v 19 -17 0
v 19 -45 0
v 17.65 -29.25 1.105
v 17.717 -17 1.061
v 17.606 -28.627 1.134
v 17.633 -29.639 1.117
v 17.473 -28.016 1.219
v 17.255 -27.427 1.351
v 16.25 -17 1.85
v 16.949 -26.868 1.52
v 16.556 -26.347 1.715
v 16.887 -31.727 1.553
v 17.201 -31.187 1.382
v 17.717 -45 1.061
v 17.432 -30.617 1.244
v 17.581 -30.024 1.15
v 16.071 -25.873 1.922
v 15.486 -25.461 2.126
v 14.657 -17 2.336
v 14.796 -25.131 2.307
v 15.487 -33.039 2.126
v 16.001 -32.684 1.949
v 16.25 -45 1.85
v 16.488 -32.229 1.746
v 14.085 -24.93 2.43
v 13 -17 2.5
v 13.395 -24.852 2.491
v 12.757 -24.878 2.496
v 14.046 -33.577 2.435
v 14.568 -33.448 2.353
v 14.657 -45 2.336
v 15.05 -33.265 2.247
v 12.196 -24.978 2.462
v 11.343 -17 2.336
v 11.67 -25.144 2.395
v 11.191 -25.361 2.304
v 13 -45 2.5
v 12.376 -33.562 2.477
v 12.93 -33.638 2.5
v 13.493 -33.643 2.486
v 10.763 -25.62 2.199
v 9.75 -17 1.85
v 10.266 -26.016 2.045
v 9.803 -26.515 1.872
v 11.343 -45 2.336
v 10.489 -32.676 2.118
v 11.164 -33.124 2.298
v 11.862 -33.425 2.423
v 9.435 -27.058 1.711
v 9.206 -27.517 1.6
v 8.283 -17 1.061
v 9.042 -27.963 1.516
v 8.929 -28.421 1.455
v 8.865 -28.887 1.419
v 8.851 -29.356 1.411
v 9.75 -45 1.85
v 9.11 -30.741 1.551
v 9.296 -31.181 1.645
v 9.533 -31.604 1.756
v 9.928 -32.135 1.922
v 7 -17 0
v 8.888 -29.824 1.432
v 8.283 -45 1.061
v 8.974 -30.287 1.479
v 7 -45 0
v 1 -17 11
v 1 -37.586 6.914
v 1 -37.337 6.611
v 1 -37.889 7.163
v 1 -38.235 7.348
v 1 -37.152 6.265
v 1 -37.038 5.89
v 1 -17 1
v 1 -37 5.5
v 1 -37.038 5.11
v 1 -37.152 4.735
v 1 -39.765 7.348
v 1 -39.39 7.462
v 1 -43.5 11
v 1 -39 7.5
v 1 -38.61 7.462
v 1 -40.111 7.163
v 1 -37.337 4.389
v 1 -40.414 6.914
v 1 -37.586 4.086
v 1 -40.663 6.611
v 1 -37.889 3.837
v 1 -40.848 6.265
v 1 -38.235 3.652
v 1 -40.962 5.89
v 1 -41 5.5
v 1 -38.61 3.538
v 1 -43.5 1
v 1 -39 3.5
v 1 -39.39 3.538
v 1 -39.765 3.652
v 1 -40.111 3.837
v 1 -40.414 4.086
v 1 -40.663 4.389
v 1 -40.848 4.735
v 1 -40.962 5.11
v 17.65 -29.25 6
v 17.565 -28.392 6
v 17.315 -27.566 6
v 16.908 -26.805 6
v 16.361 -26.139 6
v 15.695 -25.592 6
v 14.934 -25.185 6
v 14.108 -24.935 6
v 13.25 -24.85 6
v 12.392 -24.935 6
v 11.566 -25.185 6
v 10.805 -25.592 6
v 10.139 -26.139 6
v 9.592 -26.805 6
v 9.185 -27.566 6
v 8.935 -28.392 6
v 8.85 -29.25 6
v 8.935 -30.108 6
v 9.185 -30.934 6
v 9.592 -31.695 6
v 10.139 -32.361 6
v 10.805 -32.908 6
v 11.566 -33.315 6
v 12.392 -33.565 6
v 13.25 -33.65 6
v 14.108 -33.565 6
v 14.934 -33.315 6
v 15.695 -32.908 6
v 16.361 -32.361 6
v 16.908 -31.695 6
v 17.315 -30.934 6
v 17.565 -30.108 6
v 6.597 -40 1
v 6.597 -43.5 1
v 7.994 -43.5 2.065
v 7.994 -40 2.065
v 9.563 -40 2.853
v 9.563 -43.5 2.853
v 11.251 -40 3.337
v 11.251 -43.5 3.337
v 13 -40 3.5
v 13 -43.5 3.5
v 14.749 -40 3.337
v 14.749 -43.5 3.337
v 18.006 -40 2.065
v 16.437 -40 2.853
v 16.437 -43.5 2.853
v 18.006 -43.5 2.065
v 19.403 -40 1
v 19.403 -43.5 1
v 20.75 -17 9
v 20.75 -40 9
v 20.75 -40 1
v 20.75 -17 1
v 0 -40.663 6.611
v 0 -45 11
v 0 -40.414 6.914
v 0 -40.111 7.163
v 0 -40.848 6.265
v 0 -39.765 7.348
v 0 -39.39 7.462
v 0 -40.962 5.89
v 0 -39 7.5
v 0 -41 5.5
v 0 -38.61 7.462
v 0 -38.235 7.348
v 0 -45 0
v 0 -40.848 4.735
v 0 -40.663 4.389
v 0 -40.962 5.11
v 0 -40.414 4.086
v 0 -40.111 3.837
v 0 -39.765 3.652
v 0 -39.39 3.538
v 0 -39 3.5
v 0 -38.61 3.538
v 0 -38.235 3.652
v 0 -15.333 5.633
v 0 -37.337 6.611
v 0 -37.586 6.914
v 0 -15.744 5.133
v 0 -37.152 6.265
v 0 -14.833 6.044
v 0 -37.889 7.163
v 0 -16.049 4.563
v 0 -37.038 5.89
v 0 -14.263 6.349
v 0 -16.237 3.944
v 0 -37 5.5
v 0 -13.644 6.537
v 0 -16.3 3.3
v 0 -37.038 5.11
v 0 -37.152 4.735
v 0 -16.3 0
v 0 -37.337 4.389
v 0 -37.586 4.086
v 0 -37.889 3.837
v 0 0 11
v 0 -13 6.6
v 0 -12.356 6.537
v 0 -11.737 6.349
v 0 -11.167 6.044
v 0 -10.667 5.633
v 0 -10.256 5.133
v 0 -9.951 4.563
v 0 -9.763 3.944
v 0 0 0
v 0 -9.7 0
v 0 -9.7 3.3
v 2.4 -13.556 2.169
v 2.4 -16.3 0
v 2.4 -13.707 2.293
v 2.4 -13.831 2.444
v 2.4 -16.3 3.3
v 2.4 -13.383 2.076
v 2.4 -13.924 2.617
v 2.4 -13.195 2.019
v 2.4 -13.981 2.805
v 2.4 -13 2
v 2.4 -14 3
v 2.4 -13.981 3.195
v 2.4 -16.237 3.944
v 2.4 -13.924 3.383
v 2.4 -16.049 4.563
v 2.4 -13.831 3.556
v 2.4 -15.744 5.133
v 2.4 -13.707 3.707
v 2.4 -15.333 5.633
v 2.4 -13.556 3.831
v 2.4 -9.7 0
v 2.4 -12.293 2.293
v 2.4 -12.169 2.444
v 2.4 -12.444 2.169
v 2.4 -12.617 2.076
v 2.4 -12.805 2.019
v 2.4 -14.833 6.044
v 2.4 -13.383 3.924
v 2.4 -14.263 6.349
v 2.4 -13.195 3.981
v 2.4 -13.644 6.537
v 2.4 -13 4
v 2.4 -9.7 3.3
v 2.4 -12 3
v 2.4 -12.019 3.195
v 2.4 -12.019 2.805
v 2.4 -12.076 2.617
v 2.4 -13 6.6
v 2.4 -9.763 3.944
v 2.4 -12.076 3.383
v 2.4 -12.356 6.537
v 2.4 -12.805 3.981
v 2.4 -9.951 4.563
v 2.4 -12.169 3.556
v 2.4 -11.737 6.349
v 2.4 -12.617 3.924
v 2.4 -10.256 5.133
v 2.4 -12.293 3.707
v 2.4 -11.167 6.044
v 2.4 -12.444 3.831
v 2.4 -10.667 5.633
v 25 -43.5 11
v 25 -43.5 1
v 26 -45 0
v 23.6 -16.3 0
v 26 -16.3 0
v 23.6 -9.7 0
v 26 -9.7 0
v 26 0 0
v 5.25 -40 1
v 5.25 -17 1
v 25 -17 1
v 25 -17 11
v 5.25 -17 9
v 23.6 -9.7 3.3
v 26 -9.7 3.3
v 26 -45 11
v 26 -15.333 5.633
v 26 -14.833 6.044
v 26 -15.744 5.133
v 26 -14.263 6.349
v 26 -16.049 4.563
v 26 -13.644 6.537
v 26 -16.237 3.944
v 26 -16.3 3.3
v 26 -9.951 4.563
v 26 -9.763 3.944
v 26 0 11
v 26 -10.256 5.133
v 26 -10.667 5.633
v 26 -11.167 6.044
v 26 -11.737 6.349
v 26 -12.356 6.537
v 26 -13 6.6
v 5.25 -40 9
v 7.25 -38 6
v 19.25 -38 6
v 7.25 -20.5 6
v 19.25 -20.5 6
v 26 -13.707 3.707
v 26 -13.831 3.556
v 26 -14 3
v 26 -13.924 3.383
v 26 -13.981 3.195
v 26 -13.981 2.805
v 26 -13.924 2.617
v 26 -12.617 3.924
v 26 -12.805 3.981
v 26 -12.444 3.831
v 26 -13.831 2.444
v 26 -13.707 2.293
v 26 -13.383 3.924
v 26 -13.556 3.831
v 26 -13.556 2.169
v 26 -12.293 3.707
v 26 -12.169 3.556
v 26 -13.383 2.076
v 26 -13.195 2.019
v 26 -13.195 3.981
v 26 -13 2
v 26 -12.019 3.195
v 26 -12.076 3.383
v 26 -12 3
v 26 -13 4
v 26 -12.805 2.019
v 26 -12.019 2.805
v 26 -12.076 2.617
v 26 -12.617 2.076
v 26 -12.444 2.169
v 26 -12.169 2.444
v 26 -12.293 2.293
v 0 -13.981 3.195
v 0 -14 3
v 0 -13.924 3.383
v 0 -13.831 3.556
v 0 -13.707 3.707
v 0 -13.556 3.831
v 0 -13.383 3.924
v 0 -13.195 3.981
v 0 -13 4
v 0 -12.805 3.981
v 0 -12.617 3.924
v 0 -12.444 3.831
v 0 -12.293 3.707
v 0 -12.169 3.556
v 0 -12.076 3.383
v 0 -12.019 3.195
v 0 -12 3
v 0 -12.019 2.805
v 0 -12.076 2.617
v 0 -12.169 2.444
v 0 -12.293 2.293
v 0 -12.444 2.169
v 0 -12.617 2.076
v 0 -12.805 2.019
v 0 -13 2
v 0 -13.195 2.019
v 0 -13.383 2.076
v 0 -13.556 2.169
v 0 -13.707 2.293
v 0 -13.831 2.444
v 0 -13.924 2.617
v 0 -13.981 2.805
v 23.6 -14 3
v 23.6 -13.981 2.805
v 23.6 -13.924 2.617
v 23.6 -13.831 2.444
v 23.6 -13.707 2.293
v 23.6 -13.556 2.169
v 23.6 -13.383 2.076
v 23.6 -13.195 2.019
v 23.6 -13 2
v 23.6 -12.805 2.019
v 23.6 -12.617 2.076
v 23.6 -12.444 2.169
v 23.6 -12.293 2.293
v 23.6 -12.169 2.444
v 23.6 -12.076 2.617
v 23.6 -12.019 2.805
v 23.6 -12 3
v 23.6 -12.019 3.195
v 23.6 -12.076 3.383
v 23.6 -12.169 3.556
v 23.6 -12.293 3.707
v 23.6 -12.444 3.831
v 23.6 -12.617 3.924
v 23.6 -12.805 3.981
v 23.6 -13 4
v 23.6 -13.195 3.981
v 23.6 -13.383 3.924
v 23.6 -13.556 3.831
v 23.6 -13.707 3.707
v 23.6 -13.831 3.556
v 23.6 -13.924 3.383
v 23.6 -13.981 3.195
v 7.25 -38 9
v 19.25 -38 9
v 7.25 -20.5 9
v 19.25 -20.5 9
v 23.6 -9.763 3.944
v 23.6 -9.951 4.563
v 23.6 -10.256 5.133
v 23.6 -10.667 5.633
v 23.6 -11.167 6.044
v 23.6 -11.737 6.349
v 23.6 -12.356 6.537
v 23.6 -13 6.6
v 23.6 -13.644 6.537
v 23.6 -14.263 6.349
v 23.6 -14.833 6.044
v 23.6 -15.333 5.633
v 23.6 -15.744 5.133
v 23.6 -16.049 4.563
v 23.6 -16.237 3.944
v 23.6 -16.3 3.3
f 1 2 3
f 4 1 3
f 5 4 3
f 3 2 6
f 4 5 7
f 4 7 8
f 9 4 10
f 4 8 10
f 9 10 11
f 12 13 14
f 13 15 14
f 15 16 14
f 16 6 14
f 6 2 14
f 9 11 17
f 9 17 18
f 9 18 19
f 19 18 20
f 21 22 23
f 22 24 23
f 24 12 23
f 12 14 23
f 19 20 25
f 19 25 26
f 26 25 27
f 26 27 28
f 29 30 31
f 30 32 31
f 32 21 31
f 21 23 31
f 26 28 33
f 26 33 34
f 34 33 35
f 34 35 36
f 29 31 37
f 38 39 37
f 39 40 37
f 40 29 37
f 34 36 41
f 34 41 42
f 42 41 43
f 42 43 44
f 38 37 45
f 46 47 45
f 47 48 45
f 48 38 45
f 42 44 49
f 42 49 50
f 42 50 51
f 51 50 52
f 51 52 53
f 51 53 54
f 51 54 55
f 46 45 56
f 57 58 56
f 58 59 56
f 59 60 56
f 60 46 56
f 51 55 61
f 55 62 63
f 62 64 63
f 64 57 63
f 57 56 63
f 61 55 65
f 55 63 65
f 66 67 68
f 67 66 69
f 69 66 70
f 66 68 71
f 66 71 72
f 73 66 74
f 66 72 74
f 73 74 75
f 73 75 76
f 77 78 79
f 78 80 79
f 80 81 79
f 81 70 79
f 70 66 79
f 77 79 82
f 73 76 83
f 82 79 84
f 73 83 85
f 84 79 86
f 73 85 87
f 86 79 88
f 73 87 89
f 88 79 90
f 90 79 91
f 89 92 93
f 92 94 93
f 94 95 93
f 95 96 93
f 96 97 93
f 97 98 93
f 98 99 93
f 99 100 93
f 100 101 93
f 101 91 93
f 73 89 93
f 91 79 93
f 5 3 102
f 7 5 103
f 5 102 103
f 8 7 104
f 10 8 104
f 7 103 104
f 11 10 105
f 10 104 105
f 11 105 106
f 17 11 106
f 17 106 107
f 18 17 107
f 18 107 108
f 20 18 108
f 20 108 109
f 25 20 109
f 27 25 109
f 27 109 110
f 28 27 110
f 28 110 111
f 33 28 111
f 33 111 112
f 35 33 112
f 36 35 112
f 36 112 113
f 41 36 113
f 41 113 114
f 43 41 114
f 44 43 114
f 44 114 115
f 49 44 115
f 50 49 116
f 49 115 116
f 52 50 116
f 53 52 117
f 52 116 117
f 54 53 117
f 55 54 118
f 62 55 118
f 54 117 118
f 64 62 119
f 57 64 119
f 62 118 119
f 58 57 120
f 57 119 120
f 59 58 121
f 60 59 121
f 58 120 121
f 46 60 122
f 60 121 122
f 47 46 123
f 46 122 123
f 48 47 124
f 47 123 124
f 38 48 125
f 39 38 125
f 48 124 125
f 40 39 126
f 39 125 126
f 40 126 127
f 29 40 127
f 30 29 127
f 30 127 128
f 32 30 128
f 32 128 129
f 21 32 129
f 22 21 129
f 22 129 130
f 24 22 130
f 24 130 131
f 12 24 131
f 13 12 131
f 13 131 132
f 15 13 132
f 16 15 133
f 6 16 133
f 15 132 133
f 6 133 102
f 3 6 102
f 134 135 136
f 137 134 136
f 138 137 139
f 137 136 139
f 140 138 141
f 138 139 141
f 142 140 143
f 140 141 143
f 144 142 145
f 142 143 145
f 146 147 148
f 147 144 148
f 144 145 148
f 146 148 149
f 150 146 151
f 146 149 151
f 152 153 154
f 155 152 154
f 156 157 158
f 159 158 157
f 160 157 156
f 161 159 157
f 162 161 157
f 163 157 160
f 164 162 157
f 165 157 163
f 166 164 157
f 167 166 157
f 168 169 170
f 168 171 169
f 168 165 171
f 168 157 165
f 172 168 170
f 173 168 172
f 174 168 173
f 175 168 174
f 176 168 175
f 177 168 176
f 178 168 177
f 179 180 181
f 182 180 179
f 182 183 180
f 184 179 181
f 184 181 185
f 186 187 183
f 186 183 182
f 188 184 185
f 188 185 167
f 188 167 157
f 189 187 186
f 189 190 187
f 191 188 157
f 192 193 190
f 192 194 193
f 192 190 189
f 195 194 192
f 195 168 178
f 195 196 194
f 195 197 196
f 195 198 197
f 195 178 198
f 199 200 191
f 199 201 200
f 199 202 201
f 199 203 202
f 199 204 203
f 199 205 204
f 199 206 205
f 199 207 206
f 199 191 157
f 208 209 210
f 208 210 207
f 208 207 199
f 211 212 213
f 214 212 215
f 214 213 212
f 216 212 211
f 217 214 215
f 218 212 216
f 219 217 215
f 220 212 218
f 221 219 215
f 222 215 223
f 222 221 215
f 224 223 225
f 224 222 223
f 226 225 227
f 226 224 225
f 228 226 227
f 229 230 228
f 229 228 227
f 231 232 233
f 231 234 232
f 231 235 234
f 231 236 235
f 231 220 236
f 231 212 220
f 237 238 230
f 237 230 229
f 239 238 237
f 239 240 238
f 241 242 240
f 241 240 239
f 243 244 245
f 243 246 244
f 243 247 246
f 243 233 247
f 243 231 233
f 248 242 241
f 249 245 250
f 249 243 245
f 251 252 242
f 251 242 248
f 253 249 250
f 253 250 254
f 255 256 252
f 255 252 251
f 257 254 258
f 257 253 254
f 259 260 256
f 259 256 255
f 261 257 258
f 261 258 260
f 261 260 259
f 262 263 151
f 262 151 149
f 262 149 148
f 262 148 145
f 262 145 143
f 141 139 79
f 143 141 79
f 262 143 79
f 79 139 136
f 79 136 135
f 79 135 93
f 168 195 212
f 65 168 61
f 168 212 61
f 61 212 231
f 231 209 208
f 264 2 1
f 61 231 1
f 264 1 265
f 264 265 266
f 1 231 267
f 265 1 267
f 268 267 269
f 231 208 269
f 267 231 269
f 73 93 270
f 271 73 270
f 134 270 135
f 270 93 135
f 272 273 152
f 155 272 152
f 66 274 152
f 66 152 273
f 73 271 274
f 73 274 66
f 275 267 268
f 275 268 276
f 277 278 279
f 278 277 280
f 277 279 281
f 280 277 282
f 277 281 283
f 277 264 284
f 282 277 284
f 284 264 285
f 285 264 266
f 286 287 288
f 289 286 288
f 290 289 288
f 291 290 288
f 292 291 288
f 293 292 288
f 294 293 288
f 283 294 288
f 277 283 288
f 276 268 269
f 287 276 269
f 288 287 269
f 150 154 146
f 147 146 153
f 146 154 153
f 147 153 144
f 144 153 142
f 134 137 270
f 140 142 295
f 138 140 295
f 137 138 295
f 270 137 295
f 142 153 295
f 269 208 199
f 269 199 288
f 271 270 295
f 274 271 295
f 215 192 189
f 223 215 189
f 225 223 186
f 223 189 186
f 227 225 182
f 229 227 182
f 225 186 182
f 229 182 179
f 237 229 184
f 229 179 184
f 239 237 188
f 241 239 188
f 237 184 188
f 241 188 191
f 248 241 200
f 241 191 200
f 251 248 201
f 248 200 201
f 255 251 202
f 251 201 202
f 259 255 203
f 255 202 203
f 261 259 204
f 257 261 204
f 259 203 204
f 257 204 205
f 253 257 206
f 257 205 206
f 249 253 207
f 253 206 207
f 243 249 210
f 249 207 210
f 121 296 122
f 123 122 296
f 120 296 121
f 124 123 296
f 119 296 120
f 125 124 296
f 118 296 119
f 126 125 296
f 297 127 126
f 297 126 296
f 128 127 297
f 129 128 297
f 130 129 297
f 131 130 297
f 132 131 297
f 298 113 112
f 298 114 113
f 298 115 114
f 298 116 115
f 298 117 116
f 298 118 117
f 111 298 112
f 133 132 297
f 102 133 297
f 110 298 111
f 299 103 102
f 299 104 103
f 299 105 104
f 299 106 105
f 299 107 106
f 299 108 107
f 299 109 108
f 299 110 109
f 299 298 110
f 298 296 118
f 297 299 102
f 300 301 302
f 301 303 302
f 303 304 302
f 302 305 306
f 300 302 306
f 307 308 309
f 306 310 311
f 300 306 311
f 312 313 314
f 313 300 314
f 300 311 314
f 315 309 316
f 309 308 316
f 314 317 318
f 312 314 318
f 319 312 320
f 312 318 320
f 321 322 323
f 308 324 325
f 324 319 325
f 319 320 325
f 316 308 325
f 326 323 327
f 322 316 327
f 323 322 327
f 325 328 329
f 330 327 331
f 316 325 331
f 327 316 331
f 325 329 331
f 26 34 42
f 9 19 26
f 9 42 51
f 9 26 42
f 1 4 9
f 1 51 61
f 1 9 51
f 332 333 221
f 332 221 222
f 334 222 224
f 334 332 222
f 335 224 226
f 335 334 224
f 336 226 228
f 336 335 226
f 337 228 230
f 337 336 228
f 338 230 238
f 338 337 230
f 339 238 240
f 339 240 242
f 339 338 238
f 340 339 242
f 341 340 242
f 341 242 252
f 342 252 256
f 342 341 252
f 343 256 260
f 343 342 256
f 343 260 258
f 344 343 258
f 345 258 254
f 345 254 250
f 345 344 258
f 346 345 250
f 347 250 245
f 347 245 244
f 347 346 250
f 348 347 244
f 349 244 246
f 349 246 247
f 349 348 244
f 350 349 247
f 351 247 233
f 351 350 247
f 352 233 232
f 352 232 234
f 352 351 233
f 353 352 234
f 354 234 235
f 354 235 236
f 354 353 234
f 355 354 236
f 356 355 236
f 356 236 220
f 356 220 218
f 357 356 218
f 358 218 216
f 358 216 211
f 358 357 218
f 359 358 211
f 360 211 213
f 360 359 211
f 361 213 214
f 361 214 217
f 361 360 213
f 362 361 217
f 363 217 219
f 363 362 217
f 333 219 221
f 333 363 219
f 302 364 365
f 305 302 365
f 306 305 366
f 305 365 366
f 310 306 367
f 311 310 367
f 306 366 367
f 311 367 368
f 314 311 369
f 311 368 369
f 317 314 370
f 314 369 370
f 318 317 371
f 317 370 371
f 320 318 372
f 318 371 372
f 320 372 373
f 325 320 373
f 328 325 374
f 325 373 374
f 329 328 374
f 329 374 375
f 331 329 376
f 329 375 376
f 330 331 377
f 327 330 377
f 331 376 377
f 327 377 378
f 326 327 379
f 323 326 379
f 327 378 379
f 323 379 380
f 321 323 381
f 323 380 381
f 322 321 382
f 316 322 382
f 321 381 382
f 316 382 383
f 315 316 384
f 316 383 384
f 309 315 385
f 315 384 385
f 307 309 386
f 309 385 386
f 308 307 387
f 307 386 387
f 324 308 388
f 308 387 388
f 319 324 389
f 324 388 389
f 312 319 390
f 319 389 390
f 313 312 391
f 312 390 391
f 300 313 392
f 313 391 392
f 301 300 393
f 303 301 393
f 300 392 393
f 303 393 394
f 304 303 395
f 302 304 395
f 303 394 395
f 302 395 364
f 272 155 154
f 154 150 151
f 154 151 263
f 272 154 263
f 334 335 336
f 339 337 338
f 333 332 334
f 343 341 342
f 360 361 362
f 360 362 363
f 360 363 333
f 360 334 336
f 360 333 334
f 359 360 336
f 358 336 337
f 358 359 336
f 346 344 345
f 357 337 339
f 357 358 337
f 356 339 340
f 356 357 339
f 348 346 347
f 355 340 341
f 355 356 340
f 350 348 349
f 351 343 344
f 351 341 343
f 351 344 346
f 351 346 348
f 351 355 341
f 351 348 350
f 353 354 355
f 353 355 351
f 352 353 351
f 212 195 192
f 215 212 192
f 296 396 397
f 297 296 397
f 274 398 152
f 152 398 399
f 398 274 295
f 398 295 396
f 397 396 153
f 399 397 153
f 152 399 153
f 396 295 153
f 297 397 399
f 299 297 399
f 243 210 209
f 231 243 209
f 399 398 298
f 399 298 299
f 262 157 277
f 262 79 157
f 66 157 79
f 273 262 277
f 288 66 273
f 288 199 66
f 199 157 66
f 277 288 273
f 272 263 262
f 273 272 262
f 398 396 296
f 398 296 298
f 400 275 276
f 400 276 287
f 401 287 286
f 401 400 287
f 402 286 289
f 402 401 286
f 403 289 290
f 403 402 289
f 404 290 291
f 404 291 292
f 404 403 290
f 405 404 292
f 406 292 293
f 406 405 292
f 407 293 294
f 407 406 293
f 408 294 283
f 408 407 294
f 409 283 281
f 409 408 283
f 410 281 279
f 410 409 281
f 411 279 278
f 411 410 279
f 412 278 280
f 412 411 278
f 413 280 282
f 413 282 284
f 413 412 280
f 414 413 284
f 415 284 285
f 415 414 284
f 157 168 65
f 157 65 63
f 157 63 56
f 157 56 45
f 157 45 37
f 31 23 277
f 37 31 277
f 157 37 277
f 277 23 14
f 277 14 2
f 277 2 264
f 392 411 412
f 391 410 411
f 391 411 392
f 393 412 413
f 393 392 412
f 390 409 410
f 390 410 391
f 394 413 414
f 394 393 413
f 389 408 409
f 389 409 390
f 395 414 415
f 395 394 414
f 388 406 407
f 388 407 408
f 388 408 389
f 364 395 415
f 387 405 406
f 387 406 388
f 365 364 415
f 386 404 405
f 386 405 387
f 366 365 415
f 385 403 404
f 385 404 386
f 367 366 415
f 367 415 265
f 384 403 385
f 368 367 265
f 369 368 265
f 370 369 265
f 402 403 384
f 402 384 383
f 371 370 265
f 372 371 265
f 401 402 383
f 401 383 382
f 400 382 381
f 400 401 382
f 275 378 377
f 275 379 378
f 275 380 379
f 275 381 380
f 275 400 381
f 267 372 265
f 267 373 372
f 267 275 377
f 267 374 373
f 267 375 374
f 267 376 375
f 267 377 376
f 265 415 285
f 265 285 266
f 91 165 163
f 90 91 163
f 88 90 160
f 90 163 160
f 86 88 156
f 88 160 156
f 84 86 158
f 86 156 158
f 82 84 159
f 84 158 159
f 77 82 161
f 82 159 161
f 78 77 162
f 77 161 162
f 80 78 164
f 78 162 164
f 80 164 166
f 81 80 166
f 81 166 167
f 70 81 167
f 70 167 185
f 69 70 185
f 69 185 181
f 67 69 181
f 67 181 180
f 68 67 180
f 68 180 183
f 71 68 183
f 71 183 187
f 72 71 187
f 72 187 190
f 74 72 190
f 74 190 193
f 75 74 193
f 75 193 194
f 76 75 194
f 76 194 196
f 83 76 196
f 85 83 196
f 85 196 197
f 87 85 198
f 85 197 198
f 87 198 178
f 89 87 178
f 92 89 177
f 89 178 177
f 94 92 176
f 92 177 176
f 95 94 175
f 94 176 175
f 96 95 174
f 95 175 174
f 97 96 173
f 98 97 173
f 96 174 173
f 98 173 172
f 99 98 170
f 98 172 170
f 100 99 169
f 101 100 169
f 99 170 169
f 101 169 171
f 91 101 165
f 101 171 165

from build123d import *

# Parameters (mm, degrees)
SKETCH1_W           = 26
SKETCH1_H           = 45
BOSS_EXTRUDE1_DEPTH = 11
SKETCH2_R           = 8.45
CUT_EXTRUDE1_DEPTH  = 28
CUT_EXTRUDE2_DEPTH  = 26.5
BOSS_EXTRUDE2_START = 23
BOSS_EXTRUDE2_DEPTH = 23
SKETCH6_W           = 12
SKETCH6_H           = 17.5
CUT_EXTRUDE3_DEPTH  = 3
SKETCH7_R           = 4.4
CUT_EXTRUDE4_DEPTH  = 53.316345438
SKETCH8_R           = 2
CUT_EXTRUDE5_DEPTH  = 3
SKETCH9_R           = 1
CUT_EXTRUDE6_DEPTH  = 2.4
CUT_EXTRUDE7_START  = -2.4
SKETCH10_R          = 1
CUT_EXTRUDE7_DEPTH  = 2.4


with BuildPart() as part:
    # Sketch1 → Boss-Extrude1 (new body)
    with BuildSketch(Plane.XY):
        with Locations((13, -22.5)):
            Rectangle(SKETCH1_W, SKETCH1_H)
    extrude(amount=BOSS_EXTRUDE1_DEPTH)

    # Sketch2 → Cut-Extrude1 (cut)
    with BuildSketch(Plane.XZ.offset(45)):
        with Locations((13, -5.95)):
            Circle(SKETCH2_R)
    extrude(amount=-CUT_EXTRUDE1_DEPTH, mode=Mode.SUBTRACT)

    # Sketch4 → Cut-Extrude2 (cut)
    with BuildSketch(Plane(origin=(0, -43.5, 0), x_dir=(-1, 0, 0), z_dir=(0, -1, 0))):
        with BuildLine():
            Line((-1, -11), (-1, -1))
            Line((-1, -1), (-6.596875763, -1))
            ThreePointArc((-6.596875763, -1), (-13, -3.5), (-19.403124237, -1))
            Line((-19.403124237, -1), (-25, -1))
            Line((-25, -1), (-25, -11))
            Line((-25, -11), (-1, -11))
        make_face()
    extrude(amount=-CUT_EXTRUDE2_DEPTH, mode=Mode.SUBTRACT)

    # Sketch5 → Boss-Extrude2 (add)
    with BuildSketch(Plane.XZ.offset(17).offset(BOSS_EXTRUDE2_START)):
        with BuildLine():
            Line((6.596875763, 1), (5.25, 1))
            Line((5.25, 1), (5.25, 9))
            Line((5.25, 9), (20.75, 9))
            Line((20.75, 9), (20.75, 1))
            Line((20.75, 1), (19.403124237, 1))
            ThreePointArc((19.403124237, 1), (13, 3.5), (6.596875763, 1))
        make_face()
    extrude(amount=-BOSS_EXTRUDE2_DEPTH)

    # Sketch6 → Cut-Extrude3 (cut)
    with BuildSketch(Plane.XY.offset(9)):
        with Locations((13.25, -29.25)):
            Rectangle(SKETCH6_W, SKETCH6_H)
    extrude(amount=-CUT_EXTRUDE3_DEPTH, mode=Mode.SUBTRACT)

    # Sketch7 → Cut-Extrude4 (cut, through all)
    with BuildSketch(Plane.XY.offset(6)):
        with Locations((13.25, -29.25)):
            Circle(SKETCH7_R)
    extrude(amount=-CUT_EXTRUDE4_DEPTH, mode=Mode.SUBTRACT)

    # Sketch8 → Cut-Extrude5 (cut)
    with BuildSketch(Plane.ZY):
        with Locations(Location((5.5, -39, 0), (0, 0, 270))):
            Circle(SKETCH8_R)
    extrude(amount=-CUT_EXTRUDE5_DEPTH, mode=Mode.SUBTRACT)

    # Sketch9 → Cut-Extrude6 (cut)
    with BuildSketch(Plane.ZY):
        with BuildLine():
            Line((0, -16.3), (3.3, -16.3))
            ThreePointArc((3.3, -16.3), (6.6, -13), (3.3, -9.7))
            Line((3.3, -9.7), (0, -9.7))
            Line((0, -9.7), (0, -16.3))
        make_face()
        with Locations(Location((3, -13, 0), (0, 0, 270))):
            Circle(SKETCH9_R, mode=Mode.SUBTRACT)
    extrude(amount=-CUT_EXTRUDE6_DEPTH, mode=Mode.SUBTRACT)

    # Sketch10 → Cut-Extrude7 (cut)
    with BuildSketch(Plane(origin=(26, 0, 0), x_dir=(0, 0, -1), z_dir=(1, 0, 0)).offset(CUT_EXTRUDE7_START)):
        with BuildLine():
            Line((0, -16.3), (0, -9.7))
            Line((0, -9.7), (-3.3, -9.7))
            ThreePointArc((-3.3, -9.7), (-6.6, -13), (-3.3, -16.3))
            Line((-3.3, -16.3), (0, -16.3))
        make_face()
        with Locations(Location((-3, -13, 0), (0, 0, 270))):
            Circle(SKETCH10_R, mode=Mode.SUBTRACT)
    extrude(amount=CUT_EXTRUDE7_DEPTH, mode=Mode.SUBTRACT)


solid = part.part
